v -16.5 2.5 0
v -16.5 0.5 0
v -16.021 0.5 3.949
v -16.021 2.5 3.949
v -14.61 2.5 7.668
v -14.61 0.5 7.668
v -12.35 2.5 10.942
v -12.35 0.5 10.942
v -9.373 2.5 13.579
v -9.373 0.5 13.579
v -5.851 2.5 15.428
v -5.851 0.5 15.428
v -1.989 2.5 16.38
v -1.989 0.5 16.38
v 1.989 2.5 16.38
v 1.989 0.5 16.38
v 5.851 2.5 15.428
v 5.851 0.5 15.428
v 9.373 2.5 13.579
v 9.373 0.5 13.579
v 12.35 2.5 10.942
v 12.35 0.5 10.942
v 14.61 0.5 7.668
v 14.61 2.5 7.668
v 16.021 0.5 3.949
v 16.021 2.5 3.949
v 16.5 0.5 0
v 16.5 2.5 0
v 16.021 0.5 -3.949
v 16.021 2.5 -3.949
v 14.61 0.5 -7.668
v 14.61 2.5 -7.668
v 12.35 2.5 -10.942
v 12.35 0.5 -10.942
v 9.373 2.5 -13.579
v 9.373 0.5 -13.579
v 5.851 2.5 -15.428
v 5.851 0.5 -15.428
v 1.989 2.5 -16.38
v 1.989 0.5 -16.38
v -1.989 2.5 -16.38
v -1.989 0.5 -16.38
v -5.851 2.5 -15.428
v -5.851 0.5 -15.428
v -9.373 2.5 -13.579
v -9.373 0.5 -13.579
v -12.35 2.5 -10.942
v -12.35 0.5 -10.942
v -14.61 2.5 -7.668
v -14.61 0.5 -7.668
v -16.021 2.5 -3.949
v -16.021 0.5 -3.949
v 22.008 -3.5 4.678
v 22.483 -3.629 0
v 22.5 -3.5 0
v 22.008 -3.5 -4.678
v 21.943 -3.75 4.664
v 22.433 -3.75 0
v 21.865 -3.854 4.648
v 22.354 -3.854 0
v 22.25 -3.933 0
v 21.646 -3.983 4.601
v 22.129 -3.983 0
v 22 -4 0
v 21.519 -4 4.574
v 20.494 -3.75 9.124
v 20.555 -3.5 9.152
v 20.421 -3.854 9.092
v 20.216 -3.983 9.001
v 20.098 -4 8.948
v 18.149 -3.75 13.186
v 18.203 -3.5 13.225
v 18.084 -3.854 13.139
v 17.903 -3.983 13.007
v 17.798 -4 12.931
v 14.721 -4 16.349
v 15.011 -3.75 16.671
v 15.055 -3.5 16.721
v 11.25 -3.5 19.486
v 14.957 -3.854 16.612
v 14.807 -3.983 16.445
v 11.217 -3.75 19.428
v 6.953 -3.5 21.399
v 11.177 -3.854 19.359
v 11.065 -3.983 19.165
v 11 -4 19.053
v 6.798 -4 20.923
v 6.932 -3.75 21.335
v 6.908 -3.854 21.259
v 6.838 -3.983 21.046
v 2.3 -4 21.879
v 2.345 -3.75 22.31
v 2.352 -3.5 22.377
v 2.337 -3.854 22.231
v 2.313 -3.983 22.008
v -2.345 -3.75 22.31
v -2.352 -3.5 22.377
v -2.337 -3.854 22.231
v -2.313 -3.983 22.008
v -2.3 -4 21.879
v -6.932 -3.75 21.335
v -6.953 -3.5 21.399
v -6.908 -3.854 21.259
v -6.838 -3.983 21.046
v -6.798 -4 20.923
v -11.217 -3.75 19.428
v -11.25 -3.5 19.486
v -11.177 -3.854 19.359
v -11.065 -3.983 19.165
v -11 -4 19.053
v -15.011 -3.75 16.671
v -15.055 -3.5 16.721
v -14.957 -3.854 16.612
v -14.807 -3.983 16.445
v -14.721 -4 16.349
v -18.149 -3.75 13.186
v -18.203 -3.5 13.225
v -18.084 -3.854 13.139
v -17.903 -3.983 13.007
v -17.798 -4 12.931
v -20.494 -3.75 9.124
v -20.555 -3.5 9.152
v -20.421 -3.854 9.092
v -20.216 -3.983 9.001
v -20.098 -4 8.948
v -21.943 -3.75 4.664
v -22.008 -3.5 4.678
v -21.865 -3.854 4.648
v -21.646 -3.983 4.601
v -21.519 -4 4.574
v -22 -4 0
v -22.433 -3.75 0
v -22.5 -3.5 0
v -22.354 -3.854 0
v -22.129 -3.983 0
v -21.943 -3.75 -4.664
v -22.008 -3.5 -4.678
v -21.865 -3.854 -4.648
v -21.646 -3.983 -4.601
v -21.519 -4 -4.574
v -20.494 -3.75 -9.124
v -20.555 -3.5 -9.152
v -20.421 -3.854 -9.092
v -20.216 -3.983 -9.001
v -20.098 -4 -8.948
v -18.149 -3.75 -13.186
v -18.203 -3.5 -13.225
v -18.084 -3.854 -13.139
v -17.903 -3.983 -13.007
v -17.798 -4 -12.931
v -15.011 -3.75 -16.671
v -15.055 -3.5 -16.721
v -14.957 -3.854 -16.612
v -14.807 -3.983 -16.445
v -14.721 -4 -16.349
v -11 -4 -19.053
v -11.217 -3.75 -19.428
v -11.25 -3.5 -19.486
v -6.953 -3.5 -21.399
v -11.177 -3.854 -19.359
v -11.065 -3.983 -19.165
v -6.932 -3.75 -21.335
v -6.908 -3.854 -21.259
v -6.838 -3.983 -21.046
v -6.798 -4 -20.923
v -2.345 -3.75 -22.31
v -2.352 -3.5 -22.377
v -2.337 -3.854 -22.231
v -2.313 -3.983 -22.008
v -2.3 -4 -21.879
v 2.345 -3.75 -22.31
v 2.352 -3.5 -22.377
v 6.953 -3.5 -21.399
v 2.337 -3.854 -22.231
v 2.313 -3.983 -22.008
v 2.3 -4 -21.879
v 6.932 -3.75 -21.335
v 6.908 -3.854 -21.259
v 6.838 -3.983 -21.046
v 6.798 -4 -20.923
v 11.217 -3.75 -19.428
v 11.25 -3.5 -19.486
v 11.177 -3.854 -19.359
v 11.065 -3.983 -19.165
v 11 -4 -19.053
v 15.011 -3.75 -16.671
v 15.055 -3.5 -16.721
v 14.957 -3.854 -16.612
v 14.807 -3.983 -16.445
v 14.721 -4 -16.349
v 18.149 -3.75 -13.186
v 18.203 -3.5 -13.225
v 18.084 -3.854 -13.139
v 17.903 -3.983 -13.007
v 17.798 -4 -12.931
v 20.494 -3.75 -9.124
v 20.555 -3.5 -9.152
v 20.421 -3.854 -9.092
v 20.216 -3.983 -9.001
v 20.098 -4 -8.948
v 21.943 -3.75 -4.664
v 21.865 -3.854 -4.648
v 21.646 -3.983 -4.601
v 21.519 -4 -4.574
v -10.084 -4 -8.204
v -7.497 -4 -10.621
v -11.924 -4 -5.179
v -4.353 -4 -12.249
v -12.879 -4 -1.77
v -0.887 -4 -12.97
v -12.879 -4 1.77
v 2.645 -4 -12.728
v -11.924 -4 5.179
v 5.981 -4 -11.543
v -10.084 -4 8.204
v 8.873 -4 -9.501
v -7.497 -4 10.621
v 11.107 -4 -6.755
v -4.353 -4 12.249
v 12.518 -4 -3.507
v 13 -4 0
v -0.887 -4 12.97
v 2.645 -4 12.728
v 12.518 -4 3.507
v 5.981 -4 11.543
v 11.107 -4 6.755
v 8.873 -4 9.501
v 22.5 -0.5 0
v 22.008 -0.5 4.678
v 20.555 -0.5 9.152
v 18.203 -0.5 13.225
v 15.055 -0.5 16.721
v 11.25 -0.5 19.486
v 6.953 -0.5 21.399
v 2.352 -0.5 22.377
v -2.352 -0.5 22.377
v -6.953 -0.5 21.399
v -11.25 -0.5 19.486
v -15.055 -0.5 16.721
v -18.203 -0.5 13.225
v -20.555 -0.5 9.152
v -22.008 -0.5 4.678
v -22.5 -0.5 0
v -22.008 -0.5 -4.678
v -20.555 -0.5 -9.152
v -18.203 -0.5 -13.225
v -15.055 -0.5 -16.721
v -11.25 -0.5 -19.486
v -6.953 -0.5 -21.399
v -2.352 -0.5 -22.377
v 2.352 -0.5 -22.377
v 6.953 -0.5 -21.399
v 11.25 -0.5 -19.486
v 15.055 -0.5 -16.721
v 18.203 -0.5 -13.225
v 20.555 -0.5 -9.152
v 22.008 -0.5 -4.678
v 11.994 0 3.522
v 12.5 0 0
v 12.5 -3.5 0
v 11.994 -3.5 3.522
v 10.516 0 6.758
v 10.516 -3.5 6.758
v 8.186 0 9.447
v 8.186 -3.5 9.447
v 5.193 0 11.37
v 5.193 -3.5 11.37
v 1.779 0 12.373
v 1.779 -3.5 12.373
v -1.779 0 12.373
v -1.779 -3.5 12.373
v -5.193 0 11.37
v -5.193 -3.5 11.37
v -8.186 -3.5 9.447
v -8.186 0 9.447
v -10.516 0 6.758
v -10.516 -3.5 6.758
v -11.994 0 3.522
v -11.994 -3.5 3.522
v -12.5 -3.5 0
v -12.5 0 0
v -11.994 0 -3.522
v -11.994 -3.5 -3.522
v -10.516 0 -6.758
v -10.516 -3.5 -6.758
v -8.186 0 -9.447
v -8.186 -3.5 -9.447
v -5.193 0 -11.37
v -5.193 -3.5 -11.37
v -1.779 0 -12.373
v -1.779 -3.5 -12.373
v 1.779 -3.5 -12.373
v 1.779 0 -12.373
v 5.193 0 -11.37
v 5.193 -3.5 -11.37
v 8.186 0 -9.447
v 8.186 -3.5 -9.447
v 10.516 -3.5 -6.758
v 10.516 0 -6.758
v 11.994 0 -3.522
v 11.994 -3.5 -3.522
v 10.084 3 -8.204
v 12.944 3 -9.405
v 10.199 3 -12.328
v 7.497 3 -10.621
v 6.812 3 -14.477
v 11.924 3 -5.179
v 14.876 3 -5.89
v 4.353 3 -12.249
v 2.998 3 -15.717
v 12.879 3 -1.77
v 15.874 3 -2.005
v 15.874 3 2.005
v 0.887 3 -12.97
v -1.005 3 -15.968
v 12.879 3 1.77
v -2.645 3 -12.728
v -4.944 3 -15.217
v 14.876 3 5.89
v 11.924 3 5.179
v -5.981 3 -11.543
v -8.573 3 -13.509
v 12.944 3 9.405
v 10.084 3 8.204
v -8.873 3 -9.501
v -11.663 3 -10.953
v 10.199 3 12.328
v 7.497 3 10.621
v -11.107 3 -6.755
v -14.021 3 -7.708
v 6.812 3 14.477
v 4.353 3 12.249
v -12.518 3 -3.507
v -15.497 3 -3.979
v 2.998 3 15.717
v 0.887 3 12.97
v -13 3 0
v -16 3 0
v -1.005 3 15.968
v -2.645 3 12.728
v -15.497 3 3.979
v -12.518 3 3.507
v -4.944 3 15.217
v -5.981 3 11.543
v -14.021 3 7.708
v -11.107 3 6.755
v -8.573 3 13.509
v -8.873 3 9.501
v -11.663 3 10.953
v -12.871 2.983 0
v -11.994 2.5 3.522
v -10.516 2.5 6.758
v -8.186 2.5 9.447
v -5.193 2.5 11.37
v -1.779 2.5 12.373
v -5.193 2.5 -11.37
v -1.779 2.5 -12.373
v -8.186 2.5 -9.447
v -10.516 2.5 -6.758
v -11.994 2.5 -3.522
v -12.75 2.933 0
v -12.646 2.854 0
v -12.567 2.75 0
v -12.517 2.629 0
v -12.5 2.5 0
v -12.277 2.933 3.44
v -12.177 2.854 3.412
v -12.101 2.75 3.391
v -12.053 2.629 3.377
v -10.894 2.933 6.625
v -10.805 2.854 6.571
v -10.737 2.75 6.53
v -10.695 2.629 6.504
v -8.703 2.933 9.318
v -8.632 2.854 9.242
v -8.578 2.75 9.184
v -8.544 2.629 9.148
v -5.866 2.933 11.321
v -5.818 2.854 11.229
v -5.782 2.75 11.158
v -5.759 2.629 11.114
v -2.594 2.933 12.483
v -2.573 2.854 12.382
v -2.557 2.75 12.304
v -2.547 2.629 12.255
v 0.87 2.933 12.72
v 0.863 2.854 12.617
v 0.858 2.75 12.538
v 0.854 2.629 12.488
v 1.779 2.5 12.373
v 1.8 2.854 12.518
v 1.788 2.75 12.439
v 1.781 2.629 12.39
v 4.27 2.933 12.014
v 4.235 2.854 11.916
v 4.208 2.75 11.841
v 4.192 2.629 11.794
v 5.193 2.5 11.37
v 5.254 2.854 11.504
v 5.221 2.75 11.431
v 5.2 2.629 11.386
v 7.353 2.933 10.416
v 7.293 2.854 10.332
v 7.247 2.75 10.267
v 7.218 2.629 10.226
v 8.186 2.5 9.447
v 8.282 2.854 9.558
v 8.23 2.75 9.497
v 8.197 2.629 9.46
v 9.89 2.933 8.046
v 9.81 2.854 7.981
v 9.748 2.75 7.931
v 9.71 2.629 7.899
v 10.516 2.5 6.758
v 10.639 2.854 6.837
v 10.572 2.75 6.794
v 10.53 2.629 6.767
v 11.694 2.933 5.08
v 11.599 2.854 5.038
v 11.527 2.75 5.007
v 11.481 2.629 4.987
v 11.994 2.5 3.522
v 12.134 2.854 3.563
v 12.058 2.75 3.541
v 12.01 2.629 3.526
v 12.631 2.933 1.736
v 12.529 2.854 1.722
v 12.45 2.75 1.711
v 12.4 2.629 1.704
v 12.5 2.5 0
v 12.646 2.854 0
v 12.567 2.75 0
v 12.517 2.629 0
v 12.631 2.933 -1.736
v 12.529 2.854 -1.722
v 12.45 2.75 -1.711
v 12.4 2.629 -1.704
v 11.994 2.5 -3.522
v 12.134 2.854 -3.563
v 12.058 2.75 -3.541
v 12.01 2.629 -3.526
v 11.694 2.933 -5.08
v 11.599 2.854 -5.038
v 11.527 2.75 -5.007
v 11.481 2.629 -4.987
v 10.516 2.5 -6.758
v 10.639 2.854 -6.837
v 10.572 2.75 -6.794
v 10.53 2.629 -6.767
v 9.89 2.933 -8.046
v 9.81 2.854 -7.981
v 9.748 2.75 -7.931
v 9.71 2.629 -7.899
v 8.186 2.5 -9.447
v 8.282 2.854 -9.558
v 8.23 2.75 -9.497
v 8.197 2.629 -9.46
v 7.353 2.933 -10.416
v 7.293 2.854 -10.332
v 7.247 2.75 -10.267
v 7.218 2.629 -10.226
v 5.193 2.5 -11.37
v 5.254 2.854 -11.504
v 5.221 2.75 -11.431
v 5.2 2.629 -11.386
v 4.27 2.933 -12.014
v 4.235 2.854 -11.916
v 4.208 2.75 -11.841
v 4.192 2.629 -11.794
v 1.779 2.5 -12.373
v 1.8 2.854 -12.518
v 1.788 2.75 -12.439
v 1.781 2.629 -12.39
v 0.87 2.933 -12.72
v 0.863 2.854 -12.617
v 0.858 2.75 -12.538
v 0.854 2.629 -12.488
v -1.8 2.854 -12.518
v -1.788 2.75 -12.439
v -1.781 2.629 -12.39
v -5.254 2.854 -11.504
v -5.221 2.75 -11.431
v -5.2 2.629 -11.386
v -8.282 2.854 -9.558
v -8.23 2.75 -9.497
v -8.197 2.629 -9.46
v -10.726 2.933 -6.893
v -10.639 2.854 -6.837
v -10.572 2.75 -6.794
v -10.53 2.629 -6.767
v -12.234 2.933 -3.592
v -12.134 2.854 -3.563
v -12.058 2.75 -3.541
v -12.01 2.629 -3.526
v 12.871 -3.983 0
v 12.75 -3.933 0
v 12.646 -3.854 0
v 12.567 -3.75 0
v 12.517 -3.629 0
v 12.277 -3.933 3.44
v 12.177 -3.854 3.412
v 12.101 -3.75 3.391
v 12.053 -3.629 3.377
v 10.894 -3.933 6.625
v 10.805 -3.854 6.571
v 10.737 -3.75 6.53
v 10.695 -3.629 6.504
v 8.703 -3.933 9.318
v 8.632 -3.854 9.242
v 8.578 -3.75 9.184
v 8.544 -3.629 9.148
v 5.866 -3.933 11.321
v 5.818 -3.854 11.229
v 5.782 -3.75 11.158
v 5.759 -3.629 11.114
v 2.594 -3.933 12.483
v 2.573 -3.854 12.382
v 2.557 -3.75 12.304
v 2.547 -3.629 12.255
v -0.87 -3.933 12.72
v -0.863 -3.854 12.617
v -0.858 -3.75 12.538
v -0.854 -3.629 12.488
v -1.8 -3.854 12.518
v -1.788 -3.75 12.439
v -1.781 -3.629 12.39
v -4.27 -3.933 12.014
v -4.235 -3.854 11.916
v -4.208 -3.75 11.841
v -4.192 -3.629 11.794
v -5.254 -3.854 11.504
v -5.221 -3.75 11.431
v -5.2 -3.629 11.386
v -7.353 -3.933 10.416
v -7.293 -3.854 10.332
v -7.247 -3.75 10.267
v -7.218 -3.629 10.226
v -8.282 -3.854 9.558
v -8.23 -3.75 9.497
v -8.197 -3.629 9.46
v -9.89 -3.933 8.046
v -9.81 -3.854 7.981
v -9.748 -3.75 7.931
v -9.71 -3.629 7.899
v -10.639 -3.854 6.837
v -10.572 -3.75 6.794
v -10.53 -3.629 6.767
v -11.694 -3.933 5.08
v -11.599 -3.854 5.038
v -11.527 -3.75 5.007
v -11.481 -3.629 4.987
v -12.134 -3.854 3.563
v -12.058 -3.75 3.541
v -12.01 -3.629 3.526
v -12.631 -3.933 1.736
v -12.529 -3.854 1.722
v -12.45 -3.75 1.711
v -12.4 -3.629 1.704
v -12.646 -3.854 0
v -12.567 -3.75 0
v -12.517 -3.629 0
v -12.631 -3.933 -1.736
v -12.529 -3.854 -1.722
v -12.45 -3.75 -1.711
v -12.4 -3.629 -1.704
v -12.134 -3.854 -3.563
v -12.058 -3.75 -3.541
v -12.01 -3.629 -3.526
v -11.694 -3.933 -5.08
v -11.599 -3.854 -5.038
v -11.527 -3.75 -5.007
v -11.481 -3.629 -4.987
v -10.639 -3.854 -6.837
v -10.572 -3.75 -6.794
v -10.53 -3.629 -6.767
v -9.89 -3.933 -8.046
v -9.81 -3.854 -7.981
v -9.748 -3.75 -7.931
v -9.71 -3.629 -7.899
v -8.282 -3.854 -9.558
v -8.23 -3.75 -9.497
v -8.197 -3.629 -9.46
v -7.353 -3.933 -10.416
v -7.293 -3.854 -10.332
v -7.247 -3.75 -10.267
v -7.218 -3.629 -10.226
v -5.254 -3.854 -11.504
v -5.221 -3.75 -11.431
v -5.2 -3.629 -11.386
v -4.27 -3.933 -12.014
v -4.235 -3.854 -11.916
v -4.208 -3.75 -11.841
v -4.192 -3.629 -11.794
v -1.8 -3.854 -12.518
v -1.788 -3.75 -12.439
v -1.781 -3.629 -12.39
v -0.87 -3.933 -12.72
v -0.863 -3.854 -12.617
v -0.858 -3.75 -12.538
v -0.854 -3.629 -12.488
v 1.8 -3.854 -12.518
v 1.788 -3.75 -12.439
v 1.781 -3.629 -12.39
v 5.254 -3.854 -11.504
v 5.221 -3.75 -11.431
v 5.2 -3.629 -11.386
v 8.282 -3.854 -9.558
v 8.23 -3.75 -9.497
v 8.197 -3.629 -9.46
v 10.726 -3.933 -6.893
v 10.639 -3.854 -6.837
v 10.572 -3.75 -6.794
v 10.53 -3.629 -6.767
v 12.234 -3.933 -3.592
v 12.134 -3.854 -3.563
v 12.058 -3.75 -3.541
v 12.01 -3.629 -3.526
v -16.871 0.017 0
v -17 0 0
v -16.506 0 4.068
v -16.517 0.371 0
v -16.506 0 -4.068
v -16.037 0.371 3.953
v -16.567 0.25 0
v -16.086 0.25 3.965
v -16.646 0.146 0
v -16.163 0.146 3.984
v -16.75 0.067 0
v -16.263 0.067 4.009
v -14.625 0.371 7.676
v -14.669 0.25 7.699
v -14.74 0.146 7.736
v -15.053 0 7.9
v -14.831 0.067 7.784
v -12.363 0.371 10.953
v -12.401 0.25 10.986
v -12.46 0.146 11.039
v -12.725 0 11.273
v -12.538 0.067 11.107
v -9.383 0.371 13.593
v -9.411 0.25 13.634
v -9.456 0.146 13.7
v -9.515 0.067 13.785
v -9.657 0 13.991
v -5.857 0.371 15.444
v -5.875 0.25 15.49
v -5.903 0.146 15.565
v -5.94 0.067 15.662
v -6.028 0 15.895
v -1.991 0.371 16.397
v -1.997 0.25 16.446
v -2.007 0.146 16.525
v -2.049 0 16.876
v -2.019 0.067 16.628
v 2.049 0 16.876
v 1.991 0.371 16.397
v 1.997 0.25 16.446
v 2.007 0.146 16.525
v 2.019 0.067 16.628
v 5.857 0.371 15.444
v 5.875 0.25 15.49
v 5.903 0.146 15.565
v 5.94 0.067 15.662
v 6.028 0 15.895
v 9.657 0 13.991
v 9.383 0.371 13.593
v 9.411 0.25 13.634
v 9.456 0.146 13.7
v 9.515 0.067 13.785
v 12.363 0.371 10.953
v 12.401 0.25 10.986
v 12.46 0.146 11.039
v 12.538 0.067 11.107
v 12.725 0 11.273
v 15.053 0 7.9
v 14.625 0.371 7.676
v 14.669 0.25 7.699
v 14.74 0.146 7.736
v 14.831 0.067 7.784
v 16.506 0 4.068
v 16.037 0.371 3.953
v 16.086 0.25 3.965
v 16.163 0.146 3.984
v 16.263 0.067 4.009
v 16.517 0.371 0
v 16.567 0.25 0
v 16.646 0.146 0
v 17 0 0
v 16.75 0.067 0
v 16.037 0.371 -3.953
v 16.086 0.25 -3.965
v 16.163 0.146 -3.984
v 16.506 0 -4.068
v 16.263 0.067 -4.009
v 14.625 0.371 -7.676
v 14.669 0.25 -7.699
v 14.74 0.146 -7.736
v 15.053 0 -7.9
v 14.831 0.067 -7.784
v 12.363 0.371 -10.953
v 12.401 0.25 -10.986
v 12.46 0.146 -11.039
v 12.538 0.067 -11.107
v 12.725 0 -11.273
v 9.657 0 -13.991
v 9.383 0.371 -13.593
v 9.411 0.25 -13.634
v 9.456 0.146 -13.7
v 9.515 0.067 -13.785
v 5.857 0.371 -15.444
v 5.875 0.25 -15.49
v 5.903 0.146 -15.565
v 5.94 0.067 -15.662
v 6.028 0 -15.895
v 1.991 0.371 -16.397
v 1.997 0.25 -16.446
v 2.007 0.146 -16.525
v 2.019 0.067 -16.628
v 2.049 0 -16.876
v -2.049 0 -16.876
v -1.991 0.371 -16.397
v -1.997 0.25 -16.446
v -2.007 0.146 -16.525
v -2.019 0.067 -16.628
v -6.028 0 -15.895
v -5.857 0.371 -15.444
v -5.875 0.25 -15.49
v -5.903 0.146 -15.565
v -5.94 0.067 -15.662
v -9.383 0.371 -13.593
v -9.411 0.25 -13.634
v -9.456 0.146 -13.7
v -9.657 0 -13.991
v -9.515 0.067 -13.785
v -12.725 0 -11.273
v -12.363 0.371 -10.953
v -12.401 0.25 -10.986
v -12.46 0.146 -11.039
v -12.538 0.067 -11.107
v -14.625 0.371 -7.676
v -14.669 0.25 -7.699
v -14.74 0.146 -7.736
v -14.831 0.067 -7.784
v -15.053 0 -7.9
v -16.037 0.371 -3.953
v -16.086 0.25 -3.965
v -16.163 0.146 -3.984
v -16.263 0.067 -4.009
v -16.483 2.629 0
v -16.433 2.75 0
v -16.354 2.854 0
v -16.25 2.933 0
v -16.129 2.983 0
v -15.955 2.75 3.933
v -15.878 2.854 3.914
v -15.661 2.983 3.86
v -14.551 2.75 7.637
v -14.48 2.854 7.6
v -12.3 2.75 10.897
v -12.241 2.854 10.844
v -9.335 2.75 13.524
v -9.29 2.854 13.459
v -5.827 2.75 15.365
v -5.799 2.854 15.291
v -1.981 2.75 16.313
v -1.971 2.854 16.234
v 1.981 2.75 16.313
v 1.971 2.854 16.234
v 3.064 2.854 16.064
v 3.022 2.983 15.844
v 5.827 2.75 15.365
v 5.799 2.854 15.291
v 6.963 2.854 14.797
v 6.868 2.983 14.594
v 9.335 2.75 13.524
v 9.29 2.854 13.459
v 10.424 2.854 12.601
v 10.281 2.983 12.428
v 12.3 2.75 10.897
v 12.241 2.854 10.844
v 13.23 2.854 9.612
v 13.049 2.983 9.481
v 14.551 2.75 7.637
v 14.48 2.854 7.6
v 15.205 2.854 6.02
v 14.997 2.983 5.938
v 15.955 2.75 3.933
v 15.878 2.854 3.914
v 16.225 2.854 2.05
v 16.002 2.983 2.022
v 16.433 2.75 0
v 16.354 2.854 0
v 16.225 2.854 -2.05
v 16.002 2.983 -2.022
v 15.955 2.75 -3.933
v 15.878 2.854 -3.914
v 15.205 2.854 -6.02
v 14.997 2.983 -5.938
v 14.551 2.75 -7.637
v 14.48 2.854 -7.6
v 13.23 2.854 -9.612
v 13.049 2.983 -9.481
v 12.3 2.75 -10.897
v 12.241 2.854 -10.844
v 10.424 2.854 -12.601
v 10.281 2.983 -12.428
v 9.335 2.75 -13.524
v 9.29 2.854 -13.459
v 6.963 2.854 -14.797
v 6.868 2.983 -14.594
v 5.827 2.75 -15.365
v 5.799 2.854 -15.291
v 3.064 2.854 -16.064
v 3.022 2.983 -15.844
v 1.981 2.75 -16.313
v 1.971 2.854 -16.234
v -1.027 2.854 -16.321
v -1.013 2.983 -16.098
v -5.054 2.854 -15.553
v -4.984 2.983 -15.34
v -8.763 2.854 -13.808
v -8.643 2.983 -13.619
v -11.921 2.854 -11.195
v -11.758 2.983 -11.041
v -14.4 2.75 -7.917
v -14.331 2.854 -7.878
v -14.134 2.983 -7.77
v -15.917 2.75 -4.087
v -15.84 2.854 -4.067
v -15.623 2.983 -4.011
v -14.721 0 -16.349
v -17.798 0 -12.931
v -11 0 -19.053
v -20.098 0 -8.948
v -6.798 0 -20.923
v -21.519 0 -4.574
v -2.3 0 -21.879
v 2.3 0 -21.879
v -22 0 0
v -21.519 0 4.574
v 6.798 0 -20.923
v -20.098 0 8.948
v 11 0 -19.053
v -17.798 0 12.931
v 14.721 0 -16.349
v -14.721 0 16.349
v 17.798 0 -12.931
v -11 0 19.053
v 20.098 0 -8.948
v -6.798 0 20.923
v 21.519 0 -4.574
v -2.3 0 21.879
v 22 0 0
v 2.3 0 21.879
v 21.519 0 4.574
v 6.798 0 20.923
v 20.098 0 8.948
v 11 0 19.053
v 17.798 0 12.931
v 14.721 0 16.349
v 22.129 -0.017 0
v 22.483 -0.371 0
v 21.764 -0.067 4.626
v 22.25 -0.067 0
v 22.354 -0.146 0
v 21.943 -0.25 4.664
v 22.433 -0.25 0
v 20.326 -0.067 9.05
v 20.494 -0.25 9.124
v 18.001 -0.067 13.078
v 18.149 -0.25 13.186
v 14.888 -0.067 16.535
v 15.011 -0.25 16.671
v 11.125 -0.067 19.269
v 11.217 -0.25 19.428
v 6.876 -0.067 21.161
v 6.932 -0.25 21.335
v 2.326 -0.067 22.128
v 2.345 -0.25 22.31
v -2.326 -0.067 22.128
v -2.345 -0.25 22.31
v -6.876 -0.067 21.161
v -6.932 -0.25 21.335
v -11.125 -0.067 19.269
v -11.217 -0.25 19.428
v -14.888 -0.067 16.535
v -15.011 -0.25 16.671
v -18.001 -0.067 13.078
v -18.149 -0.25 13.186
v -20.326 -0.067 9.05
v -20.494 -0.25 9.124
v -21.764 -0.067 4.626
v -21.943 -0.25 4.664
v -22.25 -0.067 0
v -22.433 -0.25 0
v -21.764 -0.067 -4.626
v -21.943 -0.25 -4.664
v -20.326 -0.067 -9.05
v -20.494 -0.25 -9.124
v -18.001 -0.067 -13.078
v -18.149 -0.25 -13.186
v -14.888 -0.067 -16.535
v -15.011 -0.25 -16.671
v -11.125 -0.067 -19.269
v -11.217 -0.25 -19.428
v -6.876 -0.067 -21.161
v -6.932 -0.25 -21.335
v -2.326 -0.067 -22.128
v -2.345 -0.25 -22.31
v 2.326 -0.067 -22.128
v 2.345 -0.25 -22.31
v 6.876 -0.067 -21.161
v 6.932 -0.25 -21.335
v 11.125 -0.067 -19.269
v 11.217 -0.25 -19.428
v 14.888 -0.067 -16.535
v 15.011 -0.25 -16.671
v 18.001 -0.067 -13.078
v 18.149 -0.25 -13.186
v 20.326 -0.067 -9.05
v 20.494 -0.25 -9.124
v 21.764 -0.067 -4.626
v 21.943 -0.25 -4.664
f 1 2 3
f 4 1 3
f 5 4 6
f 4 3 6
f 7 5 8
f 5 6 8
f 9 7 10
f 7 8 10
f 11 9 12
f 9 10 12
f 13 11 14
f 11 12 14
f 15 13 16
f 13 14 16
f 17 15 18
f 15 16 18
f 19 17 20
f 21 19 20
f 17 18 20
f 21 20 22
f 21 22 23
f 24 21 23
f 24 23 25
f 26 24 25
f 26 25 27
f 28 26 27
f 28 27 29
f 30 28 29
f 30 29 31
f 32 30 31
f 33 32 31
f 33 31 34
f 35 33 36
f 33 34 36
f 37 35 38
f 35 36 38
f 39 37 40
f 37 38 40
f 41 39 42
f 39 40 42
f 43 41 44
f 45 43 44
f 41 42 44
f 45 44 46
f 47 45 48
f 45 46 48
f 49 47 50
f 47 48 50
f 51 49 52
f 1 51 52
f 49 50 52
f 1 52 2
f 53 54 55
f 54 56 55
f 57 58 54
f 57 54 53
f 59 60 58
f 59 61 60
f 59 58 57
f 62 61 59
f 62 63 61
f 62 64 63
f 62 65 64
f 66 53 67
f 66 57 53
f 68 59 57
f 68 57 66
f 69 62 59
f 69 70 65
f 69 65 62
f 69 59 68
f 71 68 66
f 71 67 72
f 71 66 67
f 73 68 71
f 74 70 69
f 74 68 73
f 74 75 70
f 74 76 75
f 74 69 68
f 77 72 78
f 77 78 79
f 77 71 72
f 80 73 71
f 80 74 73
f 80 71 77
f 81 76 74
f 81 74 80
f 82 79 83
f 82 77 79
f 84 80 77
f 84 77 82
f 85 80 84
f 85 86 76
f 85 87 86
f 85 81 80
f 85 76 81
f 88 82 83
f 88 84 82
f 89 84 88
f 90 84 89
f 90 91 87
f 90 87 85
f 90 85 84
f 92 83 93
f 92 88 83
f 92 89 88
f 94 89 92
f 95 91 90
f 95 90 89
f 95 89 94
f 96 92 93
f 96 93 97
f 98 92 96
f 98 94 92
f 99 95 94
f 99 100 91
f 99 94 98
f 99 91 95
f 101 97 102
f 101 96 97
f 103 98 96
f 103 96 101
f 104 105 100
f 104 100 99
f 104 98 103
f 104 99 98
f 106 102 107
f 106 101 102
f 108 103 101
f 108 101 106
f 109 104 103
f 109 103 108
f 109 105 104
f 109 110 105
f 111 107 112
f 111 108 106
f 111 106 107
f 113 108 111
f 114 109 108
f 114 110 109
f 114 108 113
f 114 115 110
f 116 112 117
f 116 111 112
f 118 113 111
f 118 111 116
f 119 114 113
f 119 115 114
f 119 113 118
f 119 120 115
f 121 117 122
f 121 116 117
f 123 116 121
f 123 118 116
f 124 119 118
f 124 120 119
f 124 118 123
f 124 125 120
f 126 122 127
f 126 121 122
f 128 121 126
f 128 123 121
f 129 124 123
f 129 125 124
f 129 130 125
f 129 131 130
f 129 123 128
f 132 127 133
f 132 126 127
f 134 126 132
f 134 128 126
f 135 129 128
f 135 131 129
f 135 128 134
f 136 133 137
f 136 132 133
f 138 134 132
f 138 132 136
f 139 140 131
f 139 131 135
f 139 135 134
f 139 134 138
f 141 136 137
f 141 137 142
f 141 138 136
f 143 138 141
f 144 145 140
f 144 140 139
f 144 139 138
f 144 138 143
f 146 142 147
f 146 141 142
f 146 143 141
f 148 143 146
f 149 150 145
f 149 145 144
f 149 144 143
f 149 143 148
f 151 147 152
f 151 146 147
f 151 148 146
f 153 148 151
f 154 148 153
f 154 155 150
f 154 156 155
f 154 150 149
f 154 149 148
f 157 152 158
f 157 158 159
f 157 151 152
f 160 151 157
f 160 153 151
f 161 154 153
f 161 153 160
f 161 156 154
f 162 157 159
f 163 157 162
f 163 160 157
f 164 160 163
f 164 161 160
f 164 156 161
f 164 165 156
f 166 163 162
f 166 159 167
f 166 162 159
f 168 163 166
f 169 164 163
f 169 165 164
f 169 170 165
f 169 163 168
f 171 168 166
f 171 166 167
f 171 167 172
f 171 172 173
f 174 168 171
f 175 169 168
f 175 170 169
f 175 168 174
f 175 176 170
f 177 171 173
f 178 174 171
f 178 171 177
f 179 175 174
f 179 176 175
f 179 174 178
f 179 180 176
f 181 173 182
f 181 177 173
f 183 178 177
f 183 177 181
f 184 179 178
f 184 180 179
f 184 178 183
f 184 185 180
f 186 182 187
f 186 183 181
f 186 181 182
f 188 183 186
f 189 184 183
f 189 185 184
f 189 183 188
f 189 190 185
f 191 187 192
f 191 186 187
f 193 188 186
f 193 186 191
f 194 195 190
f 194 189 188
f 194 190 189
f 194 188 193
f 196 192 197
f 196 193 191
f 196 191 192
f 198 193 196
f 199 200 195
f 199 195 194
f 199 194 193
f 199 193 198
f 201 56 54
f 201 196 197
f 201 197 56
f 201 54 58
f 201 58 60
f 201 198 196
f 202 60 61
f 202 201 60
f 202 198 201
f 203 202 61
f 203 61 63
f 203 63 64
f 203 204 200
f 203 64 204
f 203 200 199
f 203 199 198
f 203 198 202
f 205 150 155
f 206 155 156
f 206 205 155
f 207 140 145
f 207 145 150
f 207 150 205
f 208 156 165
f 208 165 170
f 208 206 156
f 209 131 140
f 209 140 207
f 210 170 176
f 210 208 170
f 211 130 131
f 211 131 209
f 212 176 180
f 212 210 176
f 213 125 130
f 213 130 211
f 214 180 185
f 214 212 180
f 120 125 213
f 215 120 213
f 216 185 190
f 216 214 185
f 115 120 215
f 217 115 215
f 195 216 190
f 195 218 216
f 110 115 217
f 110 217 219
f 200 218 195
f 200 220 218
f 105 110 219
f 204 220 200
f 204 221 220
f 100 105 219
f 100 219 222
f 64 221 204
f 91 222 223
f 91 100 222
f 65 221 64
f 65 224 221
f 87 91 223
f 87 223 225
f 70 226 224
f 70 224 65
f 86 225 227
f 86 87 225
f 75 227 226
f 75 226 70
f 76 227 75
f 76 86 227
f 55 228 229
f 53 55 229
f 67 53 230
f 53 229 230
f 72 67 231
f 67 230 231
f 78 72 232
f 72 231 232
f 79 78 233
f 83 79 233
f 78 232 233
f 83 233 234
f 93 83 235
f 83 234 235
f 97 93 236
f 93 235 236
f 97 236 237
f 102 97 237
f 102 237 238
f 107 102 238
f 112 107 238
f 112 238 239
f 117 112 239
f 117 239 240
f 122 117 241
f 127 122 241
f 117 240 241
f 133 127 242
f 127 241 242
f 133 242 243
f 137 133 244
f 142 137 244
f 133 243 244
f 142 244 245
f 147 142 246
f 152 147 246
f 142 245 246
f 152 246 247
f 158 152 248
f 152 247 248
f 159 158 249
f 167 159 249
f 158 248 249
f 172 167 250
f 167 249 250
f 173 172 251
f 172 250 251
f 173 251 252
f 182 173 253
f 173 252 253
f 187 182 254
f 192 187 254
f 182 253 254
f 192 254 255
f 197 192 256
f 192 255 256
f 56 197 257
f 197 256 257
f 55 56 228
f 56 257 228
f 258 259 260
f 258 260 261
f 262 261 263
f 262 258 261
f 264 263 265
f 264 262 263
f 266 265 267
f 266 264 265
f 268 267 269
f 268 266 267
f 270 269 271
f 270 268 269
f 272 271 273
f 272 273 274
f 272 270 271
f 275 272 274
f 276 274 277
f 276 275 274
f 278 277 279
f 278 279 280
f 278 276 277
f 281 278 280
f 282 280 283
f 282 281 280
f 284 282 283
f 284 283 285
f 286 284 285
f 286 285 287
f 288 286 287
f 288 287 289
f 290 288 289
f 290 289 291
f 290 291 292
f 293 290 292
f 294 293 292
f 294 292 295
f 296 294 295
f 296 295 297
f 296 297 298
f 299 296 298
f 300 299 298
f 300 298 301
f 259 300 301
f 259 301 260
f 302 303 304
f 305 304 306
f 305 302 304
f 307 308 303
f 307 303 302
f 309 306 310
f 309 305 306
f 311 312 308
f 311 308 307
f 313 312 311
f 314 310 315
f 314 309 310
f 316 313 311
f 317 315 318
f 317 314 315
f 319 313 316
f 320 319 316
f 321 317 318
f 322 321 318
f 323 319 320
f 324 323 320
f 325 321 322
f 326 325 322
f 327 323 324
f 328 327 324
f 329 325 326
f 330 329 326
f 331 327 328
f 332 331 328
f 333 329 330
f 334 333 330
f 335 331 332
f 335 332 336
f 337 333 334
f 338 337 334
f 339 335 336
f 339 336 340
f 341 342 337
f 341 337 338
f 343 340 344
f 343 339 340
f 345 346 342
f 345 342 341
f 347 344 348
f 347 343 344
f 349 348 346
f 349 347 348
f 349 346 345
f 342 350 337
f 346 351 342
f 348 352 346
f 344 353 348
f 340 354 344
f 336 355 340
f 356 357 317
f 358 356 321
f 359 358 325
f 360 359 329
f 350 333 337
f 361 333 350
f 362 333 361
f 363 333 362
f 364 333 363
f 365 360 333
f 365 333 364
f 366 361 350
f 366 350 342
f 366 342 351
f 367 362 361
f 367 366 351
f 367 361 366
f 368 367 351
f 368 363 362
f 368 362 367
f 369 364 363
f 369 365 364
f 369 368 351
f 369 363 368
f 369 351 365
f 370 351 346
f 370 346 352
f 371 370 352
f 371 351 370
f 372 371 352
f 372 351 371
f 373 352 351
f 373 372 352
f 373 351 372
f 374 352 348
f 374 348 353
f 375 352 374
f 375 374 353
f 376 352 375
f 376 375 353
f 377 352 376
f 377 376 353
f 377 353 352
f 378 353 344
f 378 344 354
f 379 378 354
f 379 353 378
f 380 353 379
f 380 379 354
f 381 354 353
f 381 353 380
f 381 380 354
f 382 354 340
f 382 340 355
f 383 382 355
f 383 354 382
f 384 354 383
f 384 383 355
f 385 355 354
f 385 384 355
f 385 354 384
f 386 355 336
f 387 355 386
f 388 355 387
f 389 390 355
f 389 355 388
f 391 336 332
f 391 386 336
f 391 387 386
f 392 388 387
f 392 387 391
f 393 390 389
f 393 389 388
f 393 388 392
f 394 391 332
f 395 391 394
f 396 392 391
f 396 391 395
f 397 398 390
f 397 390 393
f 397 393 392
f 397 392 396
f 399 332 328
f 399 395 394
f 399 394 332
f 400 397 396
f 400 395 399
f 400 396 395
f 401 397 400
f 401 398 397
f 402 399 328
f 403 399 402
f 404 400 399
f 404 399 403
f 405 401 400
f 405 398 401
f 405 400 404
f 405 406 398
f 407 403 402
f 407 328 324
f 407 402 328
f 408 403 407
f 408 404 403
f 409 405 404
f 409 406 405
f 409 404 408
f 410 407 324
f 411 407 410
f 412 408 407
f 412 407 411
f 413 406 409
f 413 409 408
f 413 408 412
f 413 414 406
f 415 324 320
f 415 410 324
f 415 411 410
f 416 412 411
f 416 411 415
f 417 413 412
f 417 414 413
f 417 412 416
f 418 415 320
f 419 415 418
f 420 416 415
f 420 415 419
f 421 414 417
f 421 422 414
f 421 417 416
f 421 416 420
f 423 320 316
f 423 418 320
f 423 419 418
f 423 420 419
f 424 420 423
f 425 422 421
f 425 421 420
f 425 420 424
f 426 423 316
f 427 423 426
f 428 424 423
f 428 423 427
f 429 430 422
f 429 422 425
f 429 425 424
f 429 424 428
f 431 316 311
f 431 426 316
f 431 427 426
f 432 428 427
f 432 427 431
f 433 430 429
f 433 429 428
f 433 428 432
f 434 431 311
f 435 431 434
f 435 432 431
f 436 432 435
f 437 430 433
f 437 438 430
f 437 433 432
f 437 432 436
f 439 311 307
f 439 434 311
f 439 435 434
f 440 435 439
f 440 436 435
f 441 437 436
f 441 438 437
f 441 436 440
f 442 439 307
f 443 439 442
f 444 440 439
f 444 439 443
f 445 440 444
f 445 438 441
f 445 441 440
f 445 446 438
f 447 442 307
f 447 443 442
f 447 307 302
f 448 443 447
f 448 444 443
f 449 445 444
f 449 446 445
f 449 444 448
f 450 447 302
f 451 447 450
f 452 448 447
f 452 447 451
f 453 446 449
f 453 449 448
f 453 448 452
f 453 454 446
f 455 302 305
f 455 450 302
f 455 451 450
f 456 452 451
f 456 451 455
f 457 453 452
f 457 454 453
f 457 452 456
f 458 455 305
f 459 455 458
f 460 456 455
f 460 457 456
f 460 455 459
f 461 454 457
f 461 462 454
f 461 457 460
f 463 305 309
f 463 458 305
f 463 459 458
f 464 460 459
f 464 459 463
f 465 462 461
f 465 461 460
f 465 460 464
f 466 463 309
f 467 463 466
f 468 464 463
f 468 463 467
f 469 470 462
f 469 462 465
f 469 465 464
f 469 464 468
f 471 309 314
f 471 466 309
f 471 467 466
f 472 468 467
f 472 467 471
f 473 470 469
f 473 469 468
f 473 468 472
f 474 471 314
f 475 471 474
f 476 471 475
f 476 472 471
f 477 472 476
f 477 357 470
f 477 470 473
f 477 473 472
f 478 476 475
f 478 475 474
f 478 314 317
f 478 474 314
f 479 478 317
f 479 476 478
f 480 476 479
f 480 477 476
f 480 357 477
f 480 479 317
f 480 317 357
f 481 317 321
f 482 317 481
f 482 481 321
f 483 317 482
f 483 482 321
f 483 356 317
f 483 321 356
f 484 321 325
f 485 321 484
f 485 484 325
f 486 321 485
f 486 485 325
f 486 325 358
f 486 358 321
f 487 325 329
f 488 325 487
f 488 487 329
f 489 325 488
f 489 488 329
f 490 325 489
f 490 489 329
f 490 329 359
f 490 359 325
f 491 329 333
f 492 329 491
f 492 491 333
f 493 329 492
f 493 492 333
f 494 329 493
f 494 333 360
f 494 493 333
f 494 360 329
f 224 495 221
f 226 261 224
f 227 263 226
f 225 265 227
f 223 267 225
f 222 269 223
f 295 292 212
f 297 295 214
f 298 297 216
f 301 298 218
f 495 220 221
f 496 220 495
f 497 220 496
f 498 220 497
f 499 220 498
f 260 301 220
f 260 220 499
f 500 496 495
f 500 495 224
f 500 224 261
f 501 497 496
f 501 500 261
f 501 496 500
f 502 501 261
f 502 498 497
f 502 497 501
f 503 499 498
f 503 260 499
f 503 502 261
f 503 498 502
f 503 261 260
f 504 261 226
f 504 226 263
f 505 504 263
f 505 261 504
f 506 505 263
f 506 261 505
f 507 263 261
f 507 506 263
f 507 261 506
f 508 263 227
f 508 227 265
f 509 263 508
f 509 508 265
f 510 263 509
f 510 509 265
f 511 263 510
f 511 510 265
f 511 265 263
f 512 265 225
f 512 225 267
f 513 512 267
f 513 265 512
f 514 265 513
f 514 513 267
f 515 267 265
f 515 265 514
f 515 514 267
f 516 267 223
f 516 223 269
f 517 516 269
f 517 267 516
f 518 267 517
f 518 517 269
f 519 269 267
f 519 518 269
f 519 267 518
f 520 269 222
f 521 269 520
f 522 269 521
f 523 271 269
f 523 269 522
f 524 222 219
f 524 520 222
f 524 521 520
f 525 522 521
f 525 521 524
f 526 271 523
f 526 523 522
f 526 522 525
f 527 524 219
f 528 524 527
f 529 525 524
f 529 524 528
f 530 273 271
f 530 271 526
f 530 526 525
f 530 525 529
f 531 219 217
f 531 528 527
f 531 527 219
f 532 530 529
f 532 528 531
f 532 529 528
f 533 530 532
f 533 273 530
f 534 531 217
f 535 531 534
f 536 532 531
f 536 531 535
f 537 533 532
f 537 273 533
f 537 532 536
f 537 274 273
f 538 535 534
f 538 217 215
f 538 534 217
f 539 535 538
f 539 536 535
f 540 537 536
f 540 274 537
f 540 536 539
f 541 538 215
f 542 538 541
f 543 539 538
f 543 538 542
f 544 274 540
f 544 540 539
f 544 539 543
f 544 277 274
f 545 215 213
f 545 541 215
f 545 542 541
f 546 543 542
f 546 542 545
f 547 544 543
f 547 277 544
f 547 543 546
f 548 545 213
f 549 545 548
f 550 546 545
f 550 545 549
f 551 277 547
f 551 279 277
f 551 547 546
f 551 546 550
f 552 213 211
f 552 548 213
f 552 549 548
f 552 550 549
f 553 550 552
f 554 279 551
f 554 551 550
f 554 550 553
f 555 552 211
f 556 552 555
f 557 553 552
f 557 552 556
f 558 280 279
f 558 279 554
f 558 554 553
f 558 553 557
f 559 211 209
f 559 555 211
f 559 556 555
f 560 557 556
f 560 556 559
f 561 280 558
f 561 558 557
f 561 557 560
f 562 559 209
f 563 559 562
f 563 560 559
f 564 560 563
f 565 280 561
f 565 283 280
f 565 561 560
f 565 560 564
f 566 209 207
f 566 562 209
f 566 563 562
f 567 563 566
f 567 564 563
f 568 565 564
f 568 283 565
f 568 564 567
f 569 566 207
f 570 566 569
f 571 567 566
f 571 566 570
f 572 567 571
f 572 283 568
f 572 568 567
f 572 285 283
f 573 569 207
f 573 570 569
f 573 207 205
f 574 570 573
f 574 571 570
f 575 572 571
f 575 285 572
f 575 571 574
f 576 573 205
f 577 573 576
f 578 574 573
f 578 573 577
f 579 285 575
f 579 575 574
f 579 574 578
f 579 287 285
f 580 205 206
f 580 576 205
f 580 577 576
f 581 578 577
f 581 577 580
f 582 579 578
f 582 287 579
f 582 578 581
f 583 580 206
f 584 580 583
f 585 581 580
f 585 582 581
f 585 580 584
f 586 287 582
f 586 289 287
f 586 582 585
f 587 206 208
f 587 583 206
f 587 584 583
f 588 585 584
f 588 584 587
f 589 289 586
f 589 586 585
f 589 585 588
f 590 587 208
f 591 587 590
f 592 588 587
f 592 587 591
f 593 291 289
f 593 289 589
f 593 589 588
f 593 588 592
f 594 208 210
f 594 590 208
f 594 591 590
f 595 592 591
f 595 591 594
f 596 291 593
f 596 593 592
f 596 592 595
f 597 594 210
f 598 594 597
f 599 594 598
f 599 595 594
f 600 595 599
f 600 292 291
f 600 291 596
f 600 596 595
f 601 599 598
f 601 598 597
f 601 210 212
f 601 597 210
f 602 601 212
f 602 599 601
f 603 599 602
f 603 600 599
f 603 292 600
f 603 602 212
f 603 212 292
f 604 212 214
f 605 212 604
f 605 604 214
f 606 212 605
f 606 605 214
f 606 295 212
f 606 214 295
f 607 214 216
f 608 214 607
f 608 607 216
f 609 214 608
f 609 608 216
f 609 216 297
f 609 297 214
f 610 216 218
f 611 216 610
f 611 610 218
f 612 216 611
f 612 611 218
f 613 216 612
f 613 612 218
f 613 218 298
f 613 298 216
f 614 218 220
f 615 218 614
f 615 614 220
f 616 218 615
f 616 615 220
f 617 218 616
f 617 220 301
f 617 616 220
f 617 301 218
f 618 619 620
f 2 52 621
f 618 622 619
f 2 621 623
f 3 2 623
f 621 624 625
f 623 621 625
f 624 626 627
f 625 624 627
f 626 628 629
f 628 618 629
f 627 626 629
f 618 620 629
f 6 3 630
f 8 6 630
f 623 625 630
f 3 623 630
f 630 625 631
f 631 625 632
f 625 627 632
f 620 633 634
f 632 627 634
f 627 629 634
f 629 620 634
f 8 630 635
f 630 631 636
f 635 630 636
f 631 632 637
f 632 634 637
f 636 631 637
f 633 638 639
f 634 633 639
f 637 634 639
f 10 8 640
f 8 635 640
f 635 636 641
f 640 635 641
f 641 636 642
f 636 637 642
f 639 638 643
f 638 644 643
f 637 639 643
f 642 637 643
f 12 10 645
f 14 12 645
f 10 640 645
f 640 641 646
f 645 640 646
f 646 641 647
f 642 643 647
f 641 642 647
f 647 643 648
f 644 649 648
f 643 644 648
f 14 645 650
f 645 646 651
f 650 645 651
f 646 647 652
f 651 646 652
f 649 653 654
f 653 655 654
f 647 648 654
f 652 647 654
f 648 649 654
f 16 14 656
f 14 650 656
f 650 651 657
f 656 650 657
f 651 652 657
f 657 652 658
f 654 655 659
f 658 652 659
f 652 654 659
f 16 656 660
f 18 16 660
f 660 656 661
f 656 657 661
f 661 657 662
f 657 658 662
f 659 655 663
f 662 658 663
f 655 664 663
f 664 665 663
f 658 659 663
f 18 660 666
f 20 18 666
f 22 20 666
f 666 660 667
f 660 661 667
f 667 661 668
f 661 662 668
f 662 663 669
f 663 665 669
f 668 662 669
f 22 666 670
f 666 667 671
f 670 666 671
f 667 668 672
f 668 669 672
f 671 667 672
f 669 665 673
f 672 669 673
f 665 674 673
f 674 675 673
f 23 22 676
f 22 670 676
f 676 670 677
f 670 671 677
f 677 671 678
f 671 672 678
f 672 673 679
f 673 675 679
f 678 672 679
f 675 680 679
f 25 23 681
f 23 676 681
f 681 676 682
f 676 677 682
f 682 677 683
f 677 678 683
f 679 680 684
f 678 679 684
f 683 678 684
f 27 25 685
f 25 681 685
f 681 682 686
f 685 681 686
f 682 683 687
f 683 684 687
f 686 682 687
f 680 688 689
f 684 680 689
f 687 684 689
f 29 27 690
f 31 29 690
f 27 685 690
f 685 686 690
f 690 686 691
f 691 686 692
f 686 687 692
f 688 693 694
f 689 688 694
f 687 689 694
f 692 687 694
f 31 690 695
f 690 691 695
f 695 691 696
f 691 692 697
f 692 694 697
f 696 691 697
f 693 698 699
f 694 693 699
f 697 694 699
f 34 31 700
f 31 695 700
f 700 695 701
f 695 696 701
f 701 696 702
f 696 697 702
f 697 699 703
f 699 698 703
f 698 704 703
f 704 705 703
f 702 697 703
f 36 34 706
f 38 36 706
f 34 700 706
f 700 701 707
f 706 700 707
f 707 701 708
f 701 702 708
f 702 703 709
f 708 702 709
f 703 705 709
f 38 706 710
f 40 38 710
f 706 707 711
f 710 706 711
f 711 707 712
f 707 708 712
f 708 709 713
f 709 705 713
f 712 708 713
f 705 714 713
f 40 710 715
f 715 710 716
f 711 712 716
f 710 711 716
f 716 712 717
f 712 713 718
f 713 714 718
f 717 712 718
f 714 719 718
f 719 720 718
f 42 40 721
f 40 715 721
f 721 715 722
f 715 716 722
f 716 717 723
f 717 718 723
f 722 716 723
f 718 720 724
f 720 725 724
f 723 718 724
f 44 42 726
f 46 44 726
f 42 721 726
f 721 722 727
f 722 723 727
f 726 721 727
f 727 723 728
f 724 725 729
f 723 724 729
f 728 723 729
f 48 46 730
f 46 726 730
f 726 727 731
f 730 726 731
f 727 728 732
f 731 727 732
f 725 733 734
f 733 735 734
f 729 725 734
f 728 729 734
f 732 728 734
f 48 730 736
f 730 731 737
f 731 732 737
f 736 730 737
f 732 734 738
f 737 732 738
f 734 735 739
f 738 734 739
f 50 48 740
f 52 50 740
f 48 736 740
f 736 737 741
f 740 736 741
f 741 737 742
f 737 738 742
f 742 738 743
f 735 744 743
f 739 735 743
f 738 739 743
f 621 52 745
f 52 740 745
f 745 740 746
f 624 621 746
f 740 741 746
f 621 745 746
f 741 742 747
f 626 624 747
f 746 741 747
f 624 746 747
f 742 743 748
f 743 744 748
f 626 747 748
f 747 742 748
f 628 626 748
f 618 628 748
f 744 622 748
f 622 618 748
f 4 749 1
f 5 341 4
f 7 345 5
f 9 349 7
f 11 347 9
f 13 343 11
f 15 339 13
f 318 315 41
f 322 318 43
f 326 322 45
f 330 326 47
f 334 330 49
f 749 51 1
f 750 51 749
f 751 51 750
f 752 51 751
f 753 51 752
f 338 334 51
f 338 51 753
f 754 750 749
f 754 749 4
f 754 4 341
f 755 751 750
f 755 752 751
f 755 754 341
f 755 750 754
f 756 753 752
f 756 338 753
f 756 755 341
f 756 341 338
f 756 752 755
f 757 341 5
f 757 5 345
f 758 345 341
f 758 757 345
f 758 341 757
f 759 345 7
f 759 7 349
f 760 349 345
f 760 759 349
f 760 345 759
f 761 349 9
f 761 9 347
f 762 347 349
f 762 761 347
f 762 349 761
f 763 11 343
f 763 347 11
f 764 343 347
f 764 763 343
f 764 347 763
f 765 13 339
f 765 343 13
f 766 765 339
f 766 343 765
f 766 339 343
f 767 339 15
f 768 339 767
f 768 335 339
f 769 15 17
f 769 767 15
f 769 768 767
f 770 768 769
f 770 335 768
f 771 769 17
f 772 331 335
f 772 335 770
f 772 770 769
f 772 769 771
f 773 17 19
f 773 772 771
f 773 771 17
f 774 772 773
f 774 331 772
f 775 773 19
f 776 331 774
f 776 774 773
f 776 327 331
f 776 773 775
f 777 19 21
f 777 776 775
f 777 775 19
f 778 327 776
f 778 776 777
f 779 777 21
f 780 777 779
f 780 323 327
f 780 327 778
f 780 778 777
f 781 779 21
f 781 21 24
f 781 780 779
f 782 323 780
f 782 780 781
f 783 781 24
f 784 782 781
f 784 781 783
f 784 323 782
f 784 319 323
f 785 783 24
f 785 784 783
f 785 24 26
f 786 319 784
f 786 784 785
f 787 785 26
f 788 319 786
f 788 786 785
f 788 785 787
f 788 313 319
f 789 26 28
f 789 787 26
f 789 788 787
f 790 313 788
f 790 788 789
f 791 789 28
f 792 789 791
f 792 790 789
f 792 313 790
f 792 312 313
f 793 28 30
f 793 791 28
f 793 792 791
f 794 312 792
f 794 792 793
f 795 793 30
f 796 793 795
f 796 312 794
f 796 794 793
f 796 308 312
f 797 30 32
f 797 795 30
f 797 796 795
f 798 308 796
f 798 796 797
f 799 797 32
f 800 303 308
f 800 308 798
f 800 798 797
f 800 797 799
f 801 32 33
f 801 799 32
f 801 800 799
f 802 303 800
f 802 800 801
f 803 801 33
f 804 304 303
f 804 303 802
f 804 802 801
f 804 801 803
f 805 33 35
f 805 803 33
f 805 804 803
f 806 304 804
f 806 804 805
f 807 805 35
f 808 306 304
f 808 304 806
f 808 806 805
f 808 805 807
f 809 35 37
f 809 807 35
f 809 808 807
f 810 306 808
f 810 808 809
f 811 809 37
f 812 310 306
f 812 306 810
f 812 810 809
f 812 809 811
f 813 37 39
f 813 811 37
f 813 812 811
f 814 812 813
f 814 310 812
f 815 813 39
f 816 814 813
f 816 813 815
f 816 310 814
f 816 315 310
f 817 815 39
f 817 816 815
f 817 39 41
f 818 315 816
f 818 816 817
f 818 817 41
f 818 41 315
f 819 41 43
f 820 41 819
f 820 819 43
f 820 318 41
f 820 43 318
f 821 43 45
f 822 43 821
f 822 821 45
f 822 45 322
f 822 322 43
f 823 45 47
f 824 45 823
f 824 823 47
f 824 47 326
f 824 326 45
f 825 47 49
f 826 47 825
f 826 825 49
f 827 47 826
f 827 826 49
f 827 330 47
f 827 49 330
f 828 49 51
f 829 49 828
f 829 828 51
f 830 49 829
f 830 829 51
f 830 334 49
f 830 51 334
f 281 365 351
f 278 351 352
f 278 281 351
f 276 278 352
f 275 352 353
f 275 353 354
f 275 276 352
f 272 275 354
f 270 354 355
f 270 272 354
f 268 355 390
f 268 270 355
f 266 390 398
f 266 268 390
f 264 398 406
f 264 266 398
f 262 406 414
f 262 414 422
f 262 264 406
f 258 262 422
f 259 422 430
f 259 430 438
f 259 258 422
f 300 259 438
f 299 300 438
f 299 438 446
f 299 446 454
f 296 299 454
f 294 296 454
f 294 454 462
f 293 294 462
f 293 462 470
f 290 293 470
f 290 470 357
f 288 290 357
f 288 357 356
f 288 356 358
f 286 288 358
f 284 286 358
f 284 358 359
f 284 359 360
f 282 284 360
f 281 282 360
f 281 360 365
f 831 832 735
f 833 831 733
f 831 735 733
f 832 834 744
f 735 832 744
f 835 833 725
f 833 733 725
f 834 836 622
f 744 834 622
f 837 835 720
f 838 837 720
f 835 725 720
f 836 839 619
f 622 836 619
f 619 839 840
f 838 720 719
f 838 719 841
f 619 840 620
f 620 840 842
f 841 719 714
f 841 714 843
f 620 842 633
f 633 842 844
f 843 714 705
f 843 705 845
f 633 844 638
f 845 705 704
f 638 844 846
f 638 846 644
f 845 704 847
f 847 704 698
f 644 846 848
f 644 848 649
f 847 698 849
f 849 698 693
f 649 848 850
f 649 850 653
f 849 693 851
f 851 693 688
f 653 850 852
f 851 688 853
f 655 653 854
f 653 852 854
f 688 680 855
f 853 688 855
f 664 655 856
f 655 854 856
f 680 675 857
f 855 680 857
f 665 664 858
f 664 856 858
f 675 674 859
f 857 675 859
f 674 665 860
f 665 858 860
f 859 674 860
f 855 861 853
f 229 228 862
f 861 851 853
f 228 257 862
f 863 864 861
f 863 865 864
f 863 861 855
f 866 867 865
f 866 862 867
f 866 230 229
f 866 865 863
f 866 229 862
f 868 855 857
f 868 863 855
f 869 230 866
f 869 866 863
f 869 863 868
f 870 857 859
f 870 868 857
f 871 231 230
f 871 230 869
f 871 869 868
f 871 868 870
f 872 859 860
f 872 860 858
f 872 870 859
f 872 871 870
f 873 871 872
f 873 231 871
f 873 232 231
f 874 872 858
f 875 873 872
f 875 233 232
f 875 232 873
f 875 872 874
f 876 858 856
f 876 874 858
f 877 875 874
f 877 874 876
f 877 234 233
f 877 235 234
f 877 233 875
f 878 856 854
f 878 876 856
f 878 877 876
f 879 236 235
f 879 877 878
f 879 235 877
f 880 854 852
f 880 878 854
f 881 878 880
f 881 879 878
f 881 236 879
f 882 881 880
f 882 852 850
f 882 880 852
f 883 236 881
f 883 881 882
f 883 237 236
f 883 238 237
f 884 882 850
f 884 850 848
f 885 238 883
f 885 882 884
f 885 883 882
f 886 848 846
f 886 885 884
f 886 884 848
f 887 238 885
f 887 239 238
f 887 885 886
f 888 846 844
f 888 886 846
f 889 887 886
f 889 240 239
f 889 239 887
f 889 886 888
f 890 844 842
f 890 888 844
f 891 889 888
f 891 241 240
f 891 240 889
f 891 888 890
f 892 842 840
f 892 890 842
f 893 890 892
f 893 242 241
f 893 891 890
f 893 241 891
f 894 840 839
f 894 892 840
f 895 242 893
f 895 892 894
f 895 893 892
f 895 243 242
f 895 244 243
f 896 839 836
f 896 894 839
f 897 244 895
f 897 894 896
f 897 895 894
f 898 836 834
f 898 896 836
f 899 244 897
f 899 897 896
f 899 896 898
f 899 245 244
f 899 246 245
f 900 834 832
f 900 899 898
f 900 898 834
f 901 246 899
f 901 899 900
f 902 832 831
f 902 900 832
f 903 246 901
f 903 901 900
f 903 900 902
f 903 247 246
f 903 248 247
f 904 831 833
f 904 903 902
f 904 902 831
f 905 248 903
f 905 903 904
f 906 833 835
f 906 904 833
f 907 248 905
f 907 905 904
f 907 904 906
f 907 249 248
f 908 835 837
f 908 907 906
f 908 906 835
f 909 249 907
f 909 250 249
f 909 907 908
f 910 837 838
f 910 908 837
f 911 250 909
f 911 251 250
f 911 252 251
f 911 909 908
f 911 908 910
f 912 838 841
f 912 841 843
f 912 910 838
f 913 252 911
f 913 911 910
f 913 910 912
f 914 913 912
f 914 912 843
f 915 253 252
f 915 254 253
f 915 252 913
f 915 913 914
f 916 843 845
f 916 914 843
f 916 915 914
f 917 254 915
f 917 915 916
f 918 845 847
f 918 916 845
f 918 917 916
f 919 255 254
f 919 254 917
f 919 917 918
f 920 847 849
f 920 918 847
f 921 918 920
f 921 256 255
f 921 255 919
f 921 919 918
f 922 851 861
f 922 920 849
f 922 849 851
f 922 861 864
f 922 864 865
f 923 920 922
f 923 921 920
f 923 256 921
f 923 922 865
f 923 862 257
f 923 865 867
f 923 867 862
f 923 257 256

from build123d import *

# Parameters (mm, degrees)
F0_R     = 22.5
F0_R_2   = 12.5
F1_DEPTH = 4
F2_R     = 16.5
F2_R_2   = 12.5
F3_DEPTH = 3
F4_R     = 0.5
F5_R     = 0.5


with BuildPart() as f1:
    # F0 (on Front) → F1 (new body)
    with BuildSketch(Plane.XZ):
        Circle(F0_R)
        Circle(F0_R_2, mode=Mode.SUBTRACT)
    extrude(amount=F1_DEPTH)

    # F2 (on face) → F3 (join)
    with BuildSketch(Plane(origin=(0, 0, 0), x_dir=(-1, 0, 0), z_dir=(0, 1, 0))):
        Circle(F2_R)
        Circle(F2_R_2, mode=Mode.SUBTRACT)
    extrude(amount=F3_DEPTH)

    # F4
    f4_edges = [f1.edges().sort_by_distance(p)[0] for p in [
        (-22.5, -4, 0),
        (-12.5, -4, 0),
        (-22.5, 0, 0),
        (16.5, 0, 0),
        (16.5, 3, 0),
    ]]
    fillet(f4_edges, radius=F4_R)

    # F5
    f5_edges = [f1.edges().sort_by_distance(p)[0] for p in [
        (12.5, 3, 0),
    ]]
    fillet(f5_edges, radius=F5_R)


solid = f1.part
